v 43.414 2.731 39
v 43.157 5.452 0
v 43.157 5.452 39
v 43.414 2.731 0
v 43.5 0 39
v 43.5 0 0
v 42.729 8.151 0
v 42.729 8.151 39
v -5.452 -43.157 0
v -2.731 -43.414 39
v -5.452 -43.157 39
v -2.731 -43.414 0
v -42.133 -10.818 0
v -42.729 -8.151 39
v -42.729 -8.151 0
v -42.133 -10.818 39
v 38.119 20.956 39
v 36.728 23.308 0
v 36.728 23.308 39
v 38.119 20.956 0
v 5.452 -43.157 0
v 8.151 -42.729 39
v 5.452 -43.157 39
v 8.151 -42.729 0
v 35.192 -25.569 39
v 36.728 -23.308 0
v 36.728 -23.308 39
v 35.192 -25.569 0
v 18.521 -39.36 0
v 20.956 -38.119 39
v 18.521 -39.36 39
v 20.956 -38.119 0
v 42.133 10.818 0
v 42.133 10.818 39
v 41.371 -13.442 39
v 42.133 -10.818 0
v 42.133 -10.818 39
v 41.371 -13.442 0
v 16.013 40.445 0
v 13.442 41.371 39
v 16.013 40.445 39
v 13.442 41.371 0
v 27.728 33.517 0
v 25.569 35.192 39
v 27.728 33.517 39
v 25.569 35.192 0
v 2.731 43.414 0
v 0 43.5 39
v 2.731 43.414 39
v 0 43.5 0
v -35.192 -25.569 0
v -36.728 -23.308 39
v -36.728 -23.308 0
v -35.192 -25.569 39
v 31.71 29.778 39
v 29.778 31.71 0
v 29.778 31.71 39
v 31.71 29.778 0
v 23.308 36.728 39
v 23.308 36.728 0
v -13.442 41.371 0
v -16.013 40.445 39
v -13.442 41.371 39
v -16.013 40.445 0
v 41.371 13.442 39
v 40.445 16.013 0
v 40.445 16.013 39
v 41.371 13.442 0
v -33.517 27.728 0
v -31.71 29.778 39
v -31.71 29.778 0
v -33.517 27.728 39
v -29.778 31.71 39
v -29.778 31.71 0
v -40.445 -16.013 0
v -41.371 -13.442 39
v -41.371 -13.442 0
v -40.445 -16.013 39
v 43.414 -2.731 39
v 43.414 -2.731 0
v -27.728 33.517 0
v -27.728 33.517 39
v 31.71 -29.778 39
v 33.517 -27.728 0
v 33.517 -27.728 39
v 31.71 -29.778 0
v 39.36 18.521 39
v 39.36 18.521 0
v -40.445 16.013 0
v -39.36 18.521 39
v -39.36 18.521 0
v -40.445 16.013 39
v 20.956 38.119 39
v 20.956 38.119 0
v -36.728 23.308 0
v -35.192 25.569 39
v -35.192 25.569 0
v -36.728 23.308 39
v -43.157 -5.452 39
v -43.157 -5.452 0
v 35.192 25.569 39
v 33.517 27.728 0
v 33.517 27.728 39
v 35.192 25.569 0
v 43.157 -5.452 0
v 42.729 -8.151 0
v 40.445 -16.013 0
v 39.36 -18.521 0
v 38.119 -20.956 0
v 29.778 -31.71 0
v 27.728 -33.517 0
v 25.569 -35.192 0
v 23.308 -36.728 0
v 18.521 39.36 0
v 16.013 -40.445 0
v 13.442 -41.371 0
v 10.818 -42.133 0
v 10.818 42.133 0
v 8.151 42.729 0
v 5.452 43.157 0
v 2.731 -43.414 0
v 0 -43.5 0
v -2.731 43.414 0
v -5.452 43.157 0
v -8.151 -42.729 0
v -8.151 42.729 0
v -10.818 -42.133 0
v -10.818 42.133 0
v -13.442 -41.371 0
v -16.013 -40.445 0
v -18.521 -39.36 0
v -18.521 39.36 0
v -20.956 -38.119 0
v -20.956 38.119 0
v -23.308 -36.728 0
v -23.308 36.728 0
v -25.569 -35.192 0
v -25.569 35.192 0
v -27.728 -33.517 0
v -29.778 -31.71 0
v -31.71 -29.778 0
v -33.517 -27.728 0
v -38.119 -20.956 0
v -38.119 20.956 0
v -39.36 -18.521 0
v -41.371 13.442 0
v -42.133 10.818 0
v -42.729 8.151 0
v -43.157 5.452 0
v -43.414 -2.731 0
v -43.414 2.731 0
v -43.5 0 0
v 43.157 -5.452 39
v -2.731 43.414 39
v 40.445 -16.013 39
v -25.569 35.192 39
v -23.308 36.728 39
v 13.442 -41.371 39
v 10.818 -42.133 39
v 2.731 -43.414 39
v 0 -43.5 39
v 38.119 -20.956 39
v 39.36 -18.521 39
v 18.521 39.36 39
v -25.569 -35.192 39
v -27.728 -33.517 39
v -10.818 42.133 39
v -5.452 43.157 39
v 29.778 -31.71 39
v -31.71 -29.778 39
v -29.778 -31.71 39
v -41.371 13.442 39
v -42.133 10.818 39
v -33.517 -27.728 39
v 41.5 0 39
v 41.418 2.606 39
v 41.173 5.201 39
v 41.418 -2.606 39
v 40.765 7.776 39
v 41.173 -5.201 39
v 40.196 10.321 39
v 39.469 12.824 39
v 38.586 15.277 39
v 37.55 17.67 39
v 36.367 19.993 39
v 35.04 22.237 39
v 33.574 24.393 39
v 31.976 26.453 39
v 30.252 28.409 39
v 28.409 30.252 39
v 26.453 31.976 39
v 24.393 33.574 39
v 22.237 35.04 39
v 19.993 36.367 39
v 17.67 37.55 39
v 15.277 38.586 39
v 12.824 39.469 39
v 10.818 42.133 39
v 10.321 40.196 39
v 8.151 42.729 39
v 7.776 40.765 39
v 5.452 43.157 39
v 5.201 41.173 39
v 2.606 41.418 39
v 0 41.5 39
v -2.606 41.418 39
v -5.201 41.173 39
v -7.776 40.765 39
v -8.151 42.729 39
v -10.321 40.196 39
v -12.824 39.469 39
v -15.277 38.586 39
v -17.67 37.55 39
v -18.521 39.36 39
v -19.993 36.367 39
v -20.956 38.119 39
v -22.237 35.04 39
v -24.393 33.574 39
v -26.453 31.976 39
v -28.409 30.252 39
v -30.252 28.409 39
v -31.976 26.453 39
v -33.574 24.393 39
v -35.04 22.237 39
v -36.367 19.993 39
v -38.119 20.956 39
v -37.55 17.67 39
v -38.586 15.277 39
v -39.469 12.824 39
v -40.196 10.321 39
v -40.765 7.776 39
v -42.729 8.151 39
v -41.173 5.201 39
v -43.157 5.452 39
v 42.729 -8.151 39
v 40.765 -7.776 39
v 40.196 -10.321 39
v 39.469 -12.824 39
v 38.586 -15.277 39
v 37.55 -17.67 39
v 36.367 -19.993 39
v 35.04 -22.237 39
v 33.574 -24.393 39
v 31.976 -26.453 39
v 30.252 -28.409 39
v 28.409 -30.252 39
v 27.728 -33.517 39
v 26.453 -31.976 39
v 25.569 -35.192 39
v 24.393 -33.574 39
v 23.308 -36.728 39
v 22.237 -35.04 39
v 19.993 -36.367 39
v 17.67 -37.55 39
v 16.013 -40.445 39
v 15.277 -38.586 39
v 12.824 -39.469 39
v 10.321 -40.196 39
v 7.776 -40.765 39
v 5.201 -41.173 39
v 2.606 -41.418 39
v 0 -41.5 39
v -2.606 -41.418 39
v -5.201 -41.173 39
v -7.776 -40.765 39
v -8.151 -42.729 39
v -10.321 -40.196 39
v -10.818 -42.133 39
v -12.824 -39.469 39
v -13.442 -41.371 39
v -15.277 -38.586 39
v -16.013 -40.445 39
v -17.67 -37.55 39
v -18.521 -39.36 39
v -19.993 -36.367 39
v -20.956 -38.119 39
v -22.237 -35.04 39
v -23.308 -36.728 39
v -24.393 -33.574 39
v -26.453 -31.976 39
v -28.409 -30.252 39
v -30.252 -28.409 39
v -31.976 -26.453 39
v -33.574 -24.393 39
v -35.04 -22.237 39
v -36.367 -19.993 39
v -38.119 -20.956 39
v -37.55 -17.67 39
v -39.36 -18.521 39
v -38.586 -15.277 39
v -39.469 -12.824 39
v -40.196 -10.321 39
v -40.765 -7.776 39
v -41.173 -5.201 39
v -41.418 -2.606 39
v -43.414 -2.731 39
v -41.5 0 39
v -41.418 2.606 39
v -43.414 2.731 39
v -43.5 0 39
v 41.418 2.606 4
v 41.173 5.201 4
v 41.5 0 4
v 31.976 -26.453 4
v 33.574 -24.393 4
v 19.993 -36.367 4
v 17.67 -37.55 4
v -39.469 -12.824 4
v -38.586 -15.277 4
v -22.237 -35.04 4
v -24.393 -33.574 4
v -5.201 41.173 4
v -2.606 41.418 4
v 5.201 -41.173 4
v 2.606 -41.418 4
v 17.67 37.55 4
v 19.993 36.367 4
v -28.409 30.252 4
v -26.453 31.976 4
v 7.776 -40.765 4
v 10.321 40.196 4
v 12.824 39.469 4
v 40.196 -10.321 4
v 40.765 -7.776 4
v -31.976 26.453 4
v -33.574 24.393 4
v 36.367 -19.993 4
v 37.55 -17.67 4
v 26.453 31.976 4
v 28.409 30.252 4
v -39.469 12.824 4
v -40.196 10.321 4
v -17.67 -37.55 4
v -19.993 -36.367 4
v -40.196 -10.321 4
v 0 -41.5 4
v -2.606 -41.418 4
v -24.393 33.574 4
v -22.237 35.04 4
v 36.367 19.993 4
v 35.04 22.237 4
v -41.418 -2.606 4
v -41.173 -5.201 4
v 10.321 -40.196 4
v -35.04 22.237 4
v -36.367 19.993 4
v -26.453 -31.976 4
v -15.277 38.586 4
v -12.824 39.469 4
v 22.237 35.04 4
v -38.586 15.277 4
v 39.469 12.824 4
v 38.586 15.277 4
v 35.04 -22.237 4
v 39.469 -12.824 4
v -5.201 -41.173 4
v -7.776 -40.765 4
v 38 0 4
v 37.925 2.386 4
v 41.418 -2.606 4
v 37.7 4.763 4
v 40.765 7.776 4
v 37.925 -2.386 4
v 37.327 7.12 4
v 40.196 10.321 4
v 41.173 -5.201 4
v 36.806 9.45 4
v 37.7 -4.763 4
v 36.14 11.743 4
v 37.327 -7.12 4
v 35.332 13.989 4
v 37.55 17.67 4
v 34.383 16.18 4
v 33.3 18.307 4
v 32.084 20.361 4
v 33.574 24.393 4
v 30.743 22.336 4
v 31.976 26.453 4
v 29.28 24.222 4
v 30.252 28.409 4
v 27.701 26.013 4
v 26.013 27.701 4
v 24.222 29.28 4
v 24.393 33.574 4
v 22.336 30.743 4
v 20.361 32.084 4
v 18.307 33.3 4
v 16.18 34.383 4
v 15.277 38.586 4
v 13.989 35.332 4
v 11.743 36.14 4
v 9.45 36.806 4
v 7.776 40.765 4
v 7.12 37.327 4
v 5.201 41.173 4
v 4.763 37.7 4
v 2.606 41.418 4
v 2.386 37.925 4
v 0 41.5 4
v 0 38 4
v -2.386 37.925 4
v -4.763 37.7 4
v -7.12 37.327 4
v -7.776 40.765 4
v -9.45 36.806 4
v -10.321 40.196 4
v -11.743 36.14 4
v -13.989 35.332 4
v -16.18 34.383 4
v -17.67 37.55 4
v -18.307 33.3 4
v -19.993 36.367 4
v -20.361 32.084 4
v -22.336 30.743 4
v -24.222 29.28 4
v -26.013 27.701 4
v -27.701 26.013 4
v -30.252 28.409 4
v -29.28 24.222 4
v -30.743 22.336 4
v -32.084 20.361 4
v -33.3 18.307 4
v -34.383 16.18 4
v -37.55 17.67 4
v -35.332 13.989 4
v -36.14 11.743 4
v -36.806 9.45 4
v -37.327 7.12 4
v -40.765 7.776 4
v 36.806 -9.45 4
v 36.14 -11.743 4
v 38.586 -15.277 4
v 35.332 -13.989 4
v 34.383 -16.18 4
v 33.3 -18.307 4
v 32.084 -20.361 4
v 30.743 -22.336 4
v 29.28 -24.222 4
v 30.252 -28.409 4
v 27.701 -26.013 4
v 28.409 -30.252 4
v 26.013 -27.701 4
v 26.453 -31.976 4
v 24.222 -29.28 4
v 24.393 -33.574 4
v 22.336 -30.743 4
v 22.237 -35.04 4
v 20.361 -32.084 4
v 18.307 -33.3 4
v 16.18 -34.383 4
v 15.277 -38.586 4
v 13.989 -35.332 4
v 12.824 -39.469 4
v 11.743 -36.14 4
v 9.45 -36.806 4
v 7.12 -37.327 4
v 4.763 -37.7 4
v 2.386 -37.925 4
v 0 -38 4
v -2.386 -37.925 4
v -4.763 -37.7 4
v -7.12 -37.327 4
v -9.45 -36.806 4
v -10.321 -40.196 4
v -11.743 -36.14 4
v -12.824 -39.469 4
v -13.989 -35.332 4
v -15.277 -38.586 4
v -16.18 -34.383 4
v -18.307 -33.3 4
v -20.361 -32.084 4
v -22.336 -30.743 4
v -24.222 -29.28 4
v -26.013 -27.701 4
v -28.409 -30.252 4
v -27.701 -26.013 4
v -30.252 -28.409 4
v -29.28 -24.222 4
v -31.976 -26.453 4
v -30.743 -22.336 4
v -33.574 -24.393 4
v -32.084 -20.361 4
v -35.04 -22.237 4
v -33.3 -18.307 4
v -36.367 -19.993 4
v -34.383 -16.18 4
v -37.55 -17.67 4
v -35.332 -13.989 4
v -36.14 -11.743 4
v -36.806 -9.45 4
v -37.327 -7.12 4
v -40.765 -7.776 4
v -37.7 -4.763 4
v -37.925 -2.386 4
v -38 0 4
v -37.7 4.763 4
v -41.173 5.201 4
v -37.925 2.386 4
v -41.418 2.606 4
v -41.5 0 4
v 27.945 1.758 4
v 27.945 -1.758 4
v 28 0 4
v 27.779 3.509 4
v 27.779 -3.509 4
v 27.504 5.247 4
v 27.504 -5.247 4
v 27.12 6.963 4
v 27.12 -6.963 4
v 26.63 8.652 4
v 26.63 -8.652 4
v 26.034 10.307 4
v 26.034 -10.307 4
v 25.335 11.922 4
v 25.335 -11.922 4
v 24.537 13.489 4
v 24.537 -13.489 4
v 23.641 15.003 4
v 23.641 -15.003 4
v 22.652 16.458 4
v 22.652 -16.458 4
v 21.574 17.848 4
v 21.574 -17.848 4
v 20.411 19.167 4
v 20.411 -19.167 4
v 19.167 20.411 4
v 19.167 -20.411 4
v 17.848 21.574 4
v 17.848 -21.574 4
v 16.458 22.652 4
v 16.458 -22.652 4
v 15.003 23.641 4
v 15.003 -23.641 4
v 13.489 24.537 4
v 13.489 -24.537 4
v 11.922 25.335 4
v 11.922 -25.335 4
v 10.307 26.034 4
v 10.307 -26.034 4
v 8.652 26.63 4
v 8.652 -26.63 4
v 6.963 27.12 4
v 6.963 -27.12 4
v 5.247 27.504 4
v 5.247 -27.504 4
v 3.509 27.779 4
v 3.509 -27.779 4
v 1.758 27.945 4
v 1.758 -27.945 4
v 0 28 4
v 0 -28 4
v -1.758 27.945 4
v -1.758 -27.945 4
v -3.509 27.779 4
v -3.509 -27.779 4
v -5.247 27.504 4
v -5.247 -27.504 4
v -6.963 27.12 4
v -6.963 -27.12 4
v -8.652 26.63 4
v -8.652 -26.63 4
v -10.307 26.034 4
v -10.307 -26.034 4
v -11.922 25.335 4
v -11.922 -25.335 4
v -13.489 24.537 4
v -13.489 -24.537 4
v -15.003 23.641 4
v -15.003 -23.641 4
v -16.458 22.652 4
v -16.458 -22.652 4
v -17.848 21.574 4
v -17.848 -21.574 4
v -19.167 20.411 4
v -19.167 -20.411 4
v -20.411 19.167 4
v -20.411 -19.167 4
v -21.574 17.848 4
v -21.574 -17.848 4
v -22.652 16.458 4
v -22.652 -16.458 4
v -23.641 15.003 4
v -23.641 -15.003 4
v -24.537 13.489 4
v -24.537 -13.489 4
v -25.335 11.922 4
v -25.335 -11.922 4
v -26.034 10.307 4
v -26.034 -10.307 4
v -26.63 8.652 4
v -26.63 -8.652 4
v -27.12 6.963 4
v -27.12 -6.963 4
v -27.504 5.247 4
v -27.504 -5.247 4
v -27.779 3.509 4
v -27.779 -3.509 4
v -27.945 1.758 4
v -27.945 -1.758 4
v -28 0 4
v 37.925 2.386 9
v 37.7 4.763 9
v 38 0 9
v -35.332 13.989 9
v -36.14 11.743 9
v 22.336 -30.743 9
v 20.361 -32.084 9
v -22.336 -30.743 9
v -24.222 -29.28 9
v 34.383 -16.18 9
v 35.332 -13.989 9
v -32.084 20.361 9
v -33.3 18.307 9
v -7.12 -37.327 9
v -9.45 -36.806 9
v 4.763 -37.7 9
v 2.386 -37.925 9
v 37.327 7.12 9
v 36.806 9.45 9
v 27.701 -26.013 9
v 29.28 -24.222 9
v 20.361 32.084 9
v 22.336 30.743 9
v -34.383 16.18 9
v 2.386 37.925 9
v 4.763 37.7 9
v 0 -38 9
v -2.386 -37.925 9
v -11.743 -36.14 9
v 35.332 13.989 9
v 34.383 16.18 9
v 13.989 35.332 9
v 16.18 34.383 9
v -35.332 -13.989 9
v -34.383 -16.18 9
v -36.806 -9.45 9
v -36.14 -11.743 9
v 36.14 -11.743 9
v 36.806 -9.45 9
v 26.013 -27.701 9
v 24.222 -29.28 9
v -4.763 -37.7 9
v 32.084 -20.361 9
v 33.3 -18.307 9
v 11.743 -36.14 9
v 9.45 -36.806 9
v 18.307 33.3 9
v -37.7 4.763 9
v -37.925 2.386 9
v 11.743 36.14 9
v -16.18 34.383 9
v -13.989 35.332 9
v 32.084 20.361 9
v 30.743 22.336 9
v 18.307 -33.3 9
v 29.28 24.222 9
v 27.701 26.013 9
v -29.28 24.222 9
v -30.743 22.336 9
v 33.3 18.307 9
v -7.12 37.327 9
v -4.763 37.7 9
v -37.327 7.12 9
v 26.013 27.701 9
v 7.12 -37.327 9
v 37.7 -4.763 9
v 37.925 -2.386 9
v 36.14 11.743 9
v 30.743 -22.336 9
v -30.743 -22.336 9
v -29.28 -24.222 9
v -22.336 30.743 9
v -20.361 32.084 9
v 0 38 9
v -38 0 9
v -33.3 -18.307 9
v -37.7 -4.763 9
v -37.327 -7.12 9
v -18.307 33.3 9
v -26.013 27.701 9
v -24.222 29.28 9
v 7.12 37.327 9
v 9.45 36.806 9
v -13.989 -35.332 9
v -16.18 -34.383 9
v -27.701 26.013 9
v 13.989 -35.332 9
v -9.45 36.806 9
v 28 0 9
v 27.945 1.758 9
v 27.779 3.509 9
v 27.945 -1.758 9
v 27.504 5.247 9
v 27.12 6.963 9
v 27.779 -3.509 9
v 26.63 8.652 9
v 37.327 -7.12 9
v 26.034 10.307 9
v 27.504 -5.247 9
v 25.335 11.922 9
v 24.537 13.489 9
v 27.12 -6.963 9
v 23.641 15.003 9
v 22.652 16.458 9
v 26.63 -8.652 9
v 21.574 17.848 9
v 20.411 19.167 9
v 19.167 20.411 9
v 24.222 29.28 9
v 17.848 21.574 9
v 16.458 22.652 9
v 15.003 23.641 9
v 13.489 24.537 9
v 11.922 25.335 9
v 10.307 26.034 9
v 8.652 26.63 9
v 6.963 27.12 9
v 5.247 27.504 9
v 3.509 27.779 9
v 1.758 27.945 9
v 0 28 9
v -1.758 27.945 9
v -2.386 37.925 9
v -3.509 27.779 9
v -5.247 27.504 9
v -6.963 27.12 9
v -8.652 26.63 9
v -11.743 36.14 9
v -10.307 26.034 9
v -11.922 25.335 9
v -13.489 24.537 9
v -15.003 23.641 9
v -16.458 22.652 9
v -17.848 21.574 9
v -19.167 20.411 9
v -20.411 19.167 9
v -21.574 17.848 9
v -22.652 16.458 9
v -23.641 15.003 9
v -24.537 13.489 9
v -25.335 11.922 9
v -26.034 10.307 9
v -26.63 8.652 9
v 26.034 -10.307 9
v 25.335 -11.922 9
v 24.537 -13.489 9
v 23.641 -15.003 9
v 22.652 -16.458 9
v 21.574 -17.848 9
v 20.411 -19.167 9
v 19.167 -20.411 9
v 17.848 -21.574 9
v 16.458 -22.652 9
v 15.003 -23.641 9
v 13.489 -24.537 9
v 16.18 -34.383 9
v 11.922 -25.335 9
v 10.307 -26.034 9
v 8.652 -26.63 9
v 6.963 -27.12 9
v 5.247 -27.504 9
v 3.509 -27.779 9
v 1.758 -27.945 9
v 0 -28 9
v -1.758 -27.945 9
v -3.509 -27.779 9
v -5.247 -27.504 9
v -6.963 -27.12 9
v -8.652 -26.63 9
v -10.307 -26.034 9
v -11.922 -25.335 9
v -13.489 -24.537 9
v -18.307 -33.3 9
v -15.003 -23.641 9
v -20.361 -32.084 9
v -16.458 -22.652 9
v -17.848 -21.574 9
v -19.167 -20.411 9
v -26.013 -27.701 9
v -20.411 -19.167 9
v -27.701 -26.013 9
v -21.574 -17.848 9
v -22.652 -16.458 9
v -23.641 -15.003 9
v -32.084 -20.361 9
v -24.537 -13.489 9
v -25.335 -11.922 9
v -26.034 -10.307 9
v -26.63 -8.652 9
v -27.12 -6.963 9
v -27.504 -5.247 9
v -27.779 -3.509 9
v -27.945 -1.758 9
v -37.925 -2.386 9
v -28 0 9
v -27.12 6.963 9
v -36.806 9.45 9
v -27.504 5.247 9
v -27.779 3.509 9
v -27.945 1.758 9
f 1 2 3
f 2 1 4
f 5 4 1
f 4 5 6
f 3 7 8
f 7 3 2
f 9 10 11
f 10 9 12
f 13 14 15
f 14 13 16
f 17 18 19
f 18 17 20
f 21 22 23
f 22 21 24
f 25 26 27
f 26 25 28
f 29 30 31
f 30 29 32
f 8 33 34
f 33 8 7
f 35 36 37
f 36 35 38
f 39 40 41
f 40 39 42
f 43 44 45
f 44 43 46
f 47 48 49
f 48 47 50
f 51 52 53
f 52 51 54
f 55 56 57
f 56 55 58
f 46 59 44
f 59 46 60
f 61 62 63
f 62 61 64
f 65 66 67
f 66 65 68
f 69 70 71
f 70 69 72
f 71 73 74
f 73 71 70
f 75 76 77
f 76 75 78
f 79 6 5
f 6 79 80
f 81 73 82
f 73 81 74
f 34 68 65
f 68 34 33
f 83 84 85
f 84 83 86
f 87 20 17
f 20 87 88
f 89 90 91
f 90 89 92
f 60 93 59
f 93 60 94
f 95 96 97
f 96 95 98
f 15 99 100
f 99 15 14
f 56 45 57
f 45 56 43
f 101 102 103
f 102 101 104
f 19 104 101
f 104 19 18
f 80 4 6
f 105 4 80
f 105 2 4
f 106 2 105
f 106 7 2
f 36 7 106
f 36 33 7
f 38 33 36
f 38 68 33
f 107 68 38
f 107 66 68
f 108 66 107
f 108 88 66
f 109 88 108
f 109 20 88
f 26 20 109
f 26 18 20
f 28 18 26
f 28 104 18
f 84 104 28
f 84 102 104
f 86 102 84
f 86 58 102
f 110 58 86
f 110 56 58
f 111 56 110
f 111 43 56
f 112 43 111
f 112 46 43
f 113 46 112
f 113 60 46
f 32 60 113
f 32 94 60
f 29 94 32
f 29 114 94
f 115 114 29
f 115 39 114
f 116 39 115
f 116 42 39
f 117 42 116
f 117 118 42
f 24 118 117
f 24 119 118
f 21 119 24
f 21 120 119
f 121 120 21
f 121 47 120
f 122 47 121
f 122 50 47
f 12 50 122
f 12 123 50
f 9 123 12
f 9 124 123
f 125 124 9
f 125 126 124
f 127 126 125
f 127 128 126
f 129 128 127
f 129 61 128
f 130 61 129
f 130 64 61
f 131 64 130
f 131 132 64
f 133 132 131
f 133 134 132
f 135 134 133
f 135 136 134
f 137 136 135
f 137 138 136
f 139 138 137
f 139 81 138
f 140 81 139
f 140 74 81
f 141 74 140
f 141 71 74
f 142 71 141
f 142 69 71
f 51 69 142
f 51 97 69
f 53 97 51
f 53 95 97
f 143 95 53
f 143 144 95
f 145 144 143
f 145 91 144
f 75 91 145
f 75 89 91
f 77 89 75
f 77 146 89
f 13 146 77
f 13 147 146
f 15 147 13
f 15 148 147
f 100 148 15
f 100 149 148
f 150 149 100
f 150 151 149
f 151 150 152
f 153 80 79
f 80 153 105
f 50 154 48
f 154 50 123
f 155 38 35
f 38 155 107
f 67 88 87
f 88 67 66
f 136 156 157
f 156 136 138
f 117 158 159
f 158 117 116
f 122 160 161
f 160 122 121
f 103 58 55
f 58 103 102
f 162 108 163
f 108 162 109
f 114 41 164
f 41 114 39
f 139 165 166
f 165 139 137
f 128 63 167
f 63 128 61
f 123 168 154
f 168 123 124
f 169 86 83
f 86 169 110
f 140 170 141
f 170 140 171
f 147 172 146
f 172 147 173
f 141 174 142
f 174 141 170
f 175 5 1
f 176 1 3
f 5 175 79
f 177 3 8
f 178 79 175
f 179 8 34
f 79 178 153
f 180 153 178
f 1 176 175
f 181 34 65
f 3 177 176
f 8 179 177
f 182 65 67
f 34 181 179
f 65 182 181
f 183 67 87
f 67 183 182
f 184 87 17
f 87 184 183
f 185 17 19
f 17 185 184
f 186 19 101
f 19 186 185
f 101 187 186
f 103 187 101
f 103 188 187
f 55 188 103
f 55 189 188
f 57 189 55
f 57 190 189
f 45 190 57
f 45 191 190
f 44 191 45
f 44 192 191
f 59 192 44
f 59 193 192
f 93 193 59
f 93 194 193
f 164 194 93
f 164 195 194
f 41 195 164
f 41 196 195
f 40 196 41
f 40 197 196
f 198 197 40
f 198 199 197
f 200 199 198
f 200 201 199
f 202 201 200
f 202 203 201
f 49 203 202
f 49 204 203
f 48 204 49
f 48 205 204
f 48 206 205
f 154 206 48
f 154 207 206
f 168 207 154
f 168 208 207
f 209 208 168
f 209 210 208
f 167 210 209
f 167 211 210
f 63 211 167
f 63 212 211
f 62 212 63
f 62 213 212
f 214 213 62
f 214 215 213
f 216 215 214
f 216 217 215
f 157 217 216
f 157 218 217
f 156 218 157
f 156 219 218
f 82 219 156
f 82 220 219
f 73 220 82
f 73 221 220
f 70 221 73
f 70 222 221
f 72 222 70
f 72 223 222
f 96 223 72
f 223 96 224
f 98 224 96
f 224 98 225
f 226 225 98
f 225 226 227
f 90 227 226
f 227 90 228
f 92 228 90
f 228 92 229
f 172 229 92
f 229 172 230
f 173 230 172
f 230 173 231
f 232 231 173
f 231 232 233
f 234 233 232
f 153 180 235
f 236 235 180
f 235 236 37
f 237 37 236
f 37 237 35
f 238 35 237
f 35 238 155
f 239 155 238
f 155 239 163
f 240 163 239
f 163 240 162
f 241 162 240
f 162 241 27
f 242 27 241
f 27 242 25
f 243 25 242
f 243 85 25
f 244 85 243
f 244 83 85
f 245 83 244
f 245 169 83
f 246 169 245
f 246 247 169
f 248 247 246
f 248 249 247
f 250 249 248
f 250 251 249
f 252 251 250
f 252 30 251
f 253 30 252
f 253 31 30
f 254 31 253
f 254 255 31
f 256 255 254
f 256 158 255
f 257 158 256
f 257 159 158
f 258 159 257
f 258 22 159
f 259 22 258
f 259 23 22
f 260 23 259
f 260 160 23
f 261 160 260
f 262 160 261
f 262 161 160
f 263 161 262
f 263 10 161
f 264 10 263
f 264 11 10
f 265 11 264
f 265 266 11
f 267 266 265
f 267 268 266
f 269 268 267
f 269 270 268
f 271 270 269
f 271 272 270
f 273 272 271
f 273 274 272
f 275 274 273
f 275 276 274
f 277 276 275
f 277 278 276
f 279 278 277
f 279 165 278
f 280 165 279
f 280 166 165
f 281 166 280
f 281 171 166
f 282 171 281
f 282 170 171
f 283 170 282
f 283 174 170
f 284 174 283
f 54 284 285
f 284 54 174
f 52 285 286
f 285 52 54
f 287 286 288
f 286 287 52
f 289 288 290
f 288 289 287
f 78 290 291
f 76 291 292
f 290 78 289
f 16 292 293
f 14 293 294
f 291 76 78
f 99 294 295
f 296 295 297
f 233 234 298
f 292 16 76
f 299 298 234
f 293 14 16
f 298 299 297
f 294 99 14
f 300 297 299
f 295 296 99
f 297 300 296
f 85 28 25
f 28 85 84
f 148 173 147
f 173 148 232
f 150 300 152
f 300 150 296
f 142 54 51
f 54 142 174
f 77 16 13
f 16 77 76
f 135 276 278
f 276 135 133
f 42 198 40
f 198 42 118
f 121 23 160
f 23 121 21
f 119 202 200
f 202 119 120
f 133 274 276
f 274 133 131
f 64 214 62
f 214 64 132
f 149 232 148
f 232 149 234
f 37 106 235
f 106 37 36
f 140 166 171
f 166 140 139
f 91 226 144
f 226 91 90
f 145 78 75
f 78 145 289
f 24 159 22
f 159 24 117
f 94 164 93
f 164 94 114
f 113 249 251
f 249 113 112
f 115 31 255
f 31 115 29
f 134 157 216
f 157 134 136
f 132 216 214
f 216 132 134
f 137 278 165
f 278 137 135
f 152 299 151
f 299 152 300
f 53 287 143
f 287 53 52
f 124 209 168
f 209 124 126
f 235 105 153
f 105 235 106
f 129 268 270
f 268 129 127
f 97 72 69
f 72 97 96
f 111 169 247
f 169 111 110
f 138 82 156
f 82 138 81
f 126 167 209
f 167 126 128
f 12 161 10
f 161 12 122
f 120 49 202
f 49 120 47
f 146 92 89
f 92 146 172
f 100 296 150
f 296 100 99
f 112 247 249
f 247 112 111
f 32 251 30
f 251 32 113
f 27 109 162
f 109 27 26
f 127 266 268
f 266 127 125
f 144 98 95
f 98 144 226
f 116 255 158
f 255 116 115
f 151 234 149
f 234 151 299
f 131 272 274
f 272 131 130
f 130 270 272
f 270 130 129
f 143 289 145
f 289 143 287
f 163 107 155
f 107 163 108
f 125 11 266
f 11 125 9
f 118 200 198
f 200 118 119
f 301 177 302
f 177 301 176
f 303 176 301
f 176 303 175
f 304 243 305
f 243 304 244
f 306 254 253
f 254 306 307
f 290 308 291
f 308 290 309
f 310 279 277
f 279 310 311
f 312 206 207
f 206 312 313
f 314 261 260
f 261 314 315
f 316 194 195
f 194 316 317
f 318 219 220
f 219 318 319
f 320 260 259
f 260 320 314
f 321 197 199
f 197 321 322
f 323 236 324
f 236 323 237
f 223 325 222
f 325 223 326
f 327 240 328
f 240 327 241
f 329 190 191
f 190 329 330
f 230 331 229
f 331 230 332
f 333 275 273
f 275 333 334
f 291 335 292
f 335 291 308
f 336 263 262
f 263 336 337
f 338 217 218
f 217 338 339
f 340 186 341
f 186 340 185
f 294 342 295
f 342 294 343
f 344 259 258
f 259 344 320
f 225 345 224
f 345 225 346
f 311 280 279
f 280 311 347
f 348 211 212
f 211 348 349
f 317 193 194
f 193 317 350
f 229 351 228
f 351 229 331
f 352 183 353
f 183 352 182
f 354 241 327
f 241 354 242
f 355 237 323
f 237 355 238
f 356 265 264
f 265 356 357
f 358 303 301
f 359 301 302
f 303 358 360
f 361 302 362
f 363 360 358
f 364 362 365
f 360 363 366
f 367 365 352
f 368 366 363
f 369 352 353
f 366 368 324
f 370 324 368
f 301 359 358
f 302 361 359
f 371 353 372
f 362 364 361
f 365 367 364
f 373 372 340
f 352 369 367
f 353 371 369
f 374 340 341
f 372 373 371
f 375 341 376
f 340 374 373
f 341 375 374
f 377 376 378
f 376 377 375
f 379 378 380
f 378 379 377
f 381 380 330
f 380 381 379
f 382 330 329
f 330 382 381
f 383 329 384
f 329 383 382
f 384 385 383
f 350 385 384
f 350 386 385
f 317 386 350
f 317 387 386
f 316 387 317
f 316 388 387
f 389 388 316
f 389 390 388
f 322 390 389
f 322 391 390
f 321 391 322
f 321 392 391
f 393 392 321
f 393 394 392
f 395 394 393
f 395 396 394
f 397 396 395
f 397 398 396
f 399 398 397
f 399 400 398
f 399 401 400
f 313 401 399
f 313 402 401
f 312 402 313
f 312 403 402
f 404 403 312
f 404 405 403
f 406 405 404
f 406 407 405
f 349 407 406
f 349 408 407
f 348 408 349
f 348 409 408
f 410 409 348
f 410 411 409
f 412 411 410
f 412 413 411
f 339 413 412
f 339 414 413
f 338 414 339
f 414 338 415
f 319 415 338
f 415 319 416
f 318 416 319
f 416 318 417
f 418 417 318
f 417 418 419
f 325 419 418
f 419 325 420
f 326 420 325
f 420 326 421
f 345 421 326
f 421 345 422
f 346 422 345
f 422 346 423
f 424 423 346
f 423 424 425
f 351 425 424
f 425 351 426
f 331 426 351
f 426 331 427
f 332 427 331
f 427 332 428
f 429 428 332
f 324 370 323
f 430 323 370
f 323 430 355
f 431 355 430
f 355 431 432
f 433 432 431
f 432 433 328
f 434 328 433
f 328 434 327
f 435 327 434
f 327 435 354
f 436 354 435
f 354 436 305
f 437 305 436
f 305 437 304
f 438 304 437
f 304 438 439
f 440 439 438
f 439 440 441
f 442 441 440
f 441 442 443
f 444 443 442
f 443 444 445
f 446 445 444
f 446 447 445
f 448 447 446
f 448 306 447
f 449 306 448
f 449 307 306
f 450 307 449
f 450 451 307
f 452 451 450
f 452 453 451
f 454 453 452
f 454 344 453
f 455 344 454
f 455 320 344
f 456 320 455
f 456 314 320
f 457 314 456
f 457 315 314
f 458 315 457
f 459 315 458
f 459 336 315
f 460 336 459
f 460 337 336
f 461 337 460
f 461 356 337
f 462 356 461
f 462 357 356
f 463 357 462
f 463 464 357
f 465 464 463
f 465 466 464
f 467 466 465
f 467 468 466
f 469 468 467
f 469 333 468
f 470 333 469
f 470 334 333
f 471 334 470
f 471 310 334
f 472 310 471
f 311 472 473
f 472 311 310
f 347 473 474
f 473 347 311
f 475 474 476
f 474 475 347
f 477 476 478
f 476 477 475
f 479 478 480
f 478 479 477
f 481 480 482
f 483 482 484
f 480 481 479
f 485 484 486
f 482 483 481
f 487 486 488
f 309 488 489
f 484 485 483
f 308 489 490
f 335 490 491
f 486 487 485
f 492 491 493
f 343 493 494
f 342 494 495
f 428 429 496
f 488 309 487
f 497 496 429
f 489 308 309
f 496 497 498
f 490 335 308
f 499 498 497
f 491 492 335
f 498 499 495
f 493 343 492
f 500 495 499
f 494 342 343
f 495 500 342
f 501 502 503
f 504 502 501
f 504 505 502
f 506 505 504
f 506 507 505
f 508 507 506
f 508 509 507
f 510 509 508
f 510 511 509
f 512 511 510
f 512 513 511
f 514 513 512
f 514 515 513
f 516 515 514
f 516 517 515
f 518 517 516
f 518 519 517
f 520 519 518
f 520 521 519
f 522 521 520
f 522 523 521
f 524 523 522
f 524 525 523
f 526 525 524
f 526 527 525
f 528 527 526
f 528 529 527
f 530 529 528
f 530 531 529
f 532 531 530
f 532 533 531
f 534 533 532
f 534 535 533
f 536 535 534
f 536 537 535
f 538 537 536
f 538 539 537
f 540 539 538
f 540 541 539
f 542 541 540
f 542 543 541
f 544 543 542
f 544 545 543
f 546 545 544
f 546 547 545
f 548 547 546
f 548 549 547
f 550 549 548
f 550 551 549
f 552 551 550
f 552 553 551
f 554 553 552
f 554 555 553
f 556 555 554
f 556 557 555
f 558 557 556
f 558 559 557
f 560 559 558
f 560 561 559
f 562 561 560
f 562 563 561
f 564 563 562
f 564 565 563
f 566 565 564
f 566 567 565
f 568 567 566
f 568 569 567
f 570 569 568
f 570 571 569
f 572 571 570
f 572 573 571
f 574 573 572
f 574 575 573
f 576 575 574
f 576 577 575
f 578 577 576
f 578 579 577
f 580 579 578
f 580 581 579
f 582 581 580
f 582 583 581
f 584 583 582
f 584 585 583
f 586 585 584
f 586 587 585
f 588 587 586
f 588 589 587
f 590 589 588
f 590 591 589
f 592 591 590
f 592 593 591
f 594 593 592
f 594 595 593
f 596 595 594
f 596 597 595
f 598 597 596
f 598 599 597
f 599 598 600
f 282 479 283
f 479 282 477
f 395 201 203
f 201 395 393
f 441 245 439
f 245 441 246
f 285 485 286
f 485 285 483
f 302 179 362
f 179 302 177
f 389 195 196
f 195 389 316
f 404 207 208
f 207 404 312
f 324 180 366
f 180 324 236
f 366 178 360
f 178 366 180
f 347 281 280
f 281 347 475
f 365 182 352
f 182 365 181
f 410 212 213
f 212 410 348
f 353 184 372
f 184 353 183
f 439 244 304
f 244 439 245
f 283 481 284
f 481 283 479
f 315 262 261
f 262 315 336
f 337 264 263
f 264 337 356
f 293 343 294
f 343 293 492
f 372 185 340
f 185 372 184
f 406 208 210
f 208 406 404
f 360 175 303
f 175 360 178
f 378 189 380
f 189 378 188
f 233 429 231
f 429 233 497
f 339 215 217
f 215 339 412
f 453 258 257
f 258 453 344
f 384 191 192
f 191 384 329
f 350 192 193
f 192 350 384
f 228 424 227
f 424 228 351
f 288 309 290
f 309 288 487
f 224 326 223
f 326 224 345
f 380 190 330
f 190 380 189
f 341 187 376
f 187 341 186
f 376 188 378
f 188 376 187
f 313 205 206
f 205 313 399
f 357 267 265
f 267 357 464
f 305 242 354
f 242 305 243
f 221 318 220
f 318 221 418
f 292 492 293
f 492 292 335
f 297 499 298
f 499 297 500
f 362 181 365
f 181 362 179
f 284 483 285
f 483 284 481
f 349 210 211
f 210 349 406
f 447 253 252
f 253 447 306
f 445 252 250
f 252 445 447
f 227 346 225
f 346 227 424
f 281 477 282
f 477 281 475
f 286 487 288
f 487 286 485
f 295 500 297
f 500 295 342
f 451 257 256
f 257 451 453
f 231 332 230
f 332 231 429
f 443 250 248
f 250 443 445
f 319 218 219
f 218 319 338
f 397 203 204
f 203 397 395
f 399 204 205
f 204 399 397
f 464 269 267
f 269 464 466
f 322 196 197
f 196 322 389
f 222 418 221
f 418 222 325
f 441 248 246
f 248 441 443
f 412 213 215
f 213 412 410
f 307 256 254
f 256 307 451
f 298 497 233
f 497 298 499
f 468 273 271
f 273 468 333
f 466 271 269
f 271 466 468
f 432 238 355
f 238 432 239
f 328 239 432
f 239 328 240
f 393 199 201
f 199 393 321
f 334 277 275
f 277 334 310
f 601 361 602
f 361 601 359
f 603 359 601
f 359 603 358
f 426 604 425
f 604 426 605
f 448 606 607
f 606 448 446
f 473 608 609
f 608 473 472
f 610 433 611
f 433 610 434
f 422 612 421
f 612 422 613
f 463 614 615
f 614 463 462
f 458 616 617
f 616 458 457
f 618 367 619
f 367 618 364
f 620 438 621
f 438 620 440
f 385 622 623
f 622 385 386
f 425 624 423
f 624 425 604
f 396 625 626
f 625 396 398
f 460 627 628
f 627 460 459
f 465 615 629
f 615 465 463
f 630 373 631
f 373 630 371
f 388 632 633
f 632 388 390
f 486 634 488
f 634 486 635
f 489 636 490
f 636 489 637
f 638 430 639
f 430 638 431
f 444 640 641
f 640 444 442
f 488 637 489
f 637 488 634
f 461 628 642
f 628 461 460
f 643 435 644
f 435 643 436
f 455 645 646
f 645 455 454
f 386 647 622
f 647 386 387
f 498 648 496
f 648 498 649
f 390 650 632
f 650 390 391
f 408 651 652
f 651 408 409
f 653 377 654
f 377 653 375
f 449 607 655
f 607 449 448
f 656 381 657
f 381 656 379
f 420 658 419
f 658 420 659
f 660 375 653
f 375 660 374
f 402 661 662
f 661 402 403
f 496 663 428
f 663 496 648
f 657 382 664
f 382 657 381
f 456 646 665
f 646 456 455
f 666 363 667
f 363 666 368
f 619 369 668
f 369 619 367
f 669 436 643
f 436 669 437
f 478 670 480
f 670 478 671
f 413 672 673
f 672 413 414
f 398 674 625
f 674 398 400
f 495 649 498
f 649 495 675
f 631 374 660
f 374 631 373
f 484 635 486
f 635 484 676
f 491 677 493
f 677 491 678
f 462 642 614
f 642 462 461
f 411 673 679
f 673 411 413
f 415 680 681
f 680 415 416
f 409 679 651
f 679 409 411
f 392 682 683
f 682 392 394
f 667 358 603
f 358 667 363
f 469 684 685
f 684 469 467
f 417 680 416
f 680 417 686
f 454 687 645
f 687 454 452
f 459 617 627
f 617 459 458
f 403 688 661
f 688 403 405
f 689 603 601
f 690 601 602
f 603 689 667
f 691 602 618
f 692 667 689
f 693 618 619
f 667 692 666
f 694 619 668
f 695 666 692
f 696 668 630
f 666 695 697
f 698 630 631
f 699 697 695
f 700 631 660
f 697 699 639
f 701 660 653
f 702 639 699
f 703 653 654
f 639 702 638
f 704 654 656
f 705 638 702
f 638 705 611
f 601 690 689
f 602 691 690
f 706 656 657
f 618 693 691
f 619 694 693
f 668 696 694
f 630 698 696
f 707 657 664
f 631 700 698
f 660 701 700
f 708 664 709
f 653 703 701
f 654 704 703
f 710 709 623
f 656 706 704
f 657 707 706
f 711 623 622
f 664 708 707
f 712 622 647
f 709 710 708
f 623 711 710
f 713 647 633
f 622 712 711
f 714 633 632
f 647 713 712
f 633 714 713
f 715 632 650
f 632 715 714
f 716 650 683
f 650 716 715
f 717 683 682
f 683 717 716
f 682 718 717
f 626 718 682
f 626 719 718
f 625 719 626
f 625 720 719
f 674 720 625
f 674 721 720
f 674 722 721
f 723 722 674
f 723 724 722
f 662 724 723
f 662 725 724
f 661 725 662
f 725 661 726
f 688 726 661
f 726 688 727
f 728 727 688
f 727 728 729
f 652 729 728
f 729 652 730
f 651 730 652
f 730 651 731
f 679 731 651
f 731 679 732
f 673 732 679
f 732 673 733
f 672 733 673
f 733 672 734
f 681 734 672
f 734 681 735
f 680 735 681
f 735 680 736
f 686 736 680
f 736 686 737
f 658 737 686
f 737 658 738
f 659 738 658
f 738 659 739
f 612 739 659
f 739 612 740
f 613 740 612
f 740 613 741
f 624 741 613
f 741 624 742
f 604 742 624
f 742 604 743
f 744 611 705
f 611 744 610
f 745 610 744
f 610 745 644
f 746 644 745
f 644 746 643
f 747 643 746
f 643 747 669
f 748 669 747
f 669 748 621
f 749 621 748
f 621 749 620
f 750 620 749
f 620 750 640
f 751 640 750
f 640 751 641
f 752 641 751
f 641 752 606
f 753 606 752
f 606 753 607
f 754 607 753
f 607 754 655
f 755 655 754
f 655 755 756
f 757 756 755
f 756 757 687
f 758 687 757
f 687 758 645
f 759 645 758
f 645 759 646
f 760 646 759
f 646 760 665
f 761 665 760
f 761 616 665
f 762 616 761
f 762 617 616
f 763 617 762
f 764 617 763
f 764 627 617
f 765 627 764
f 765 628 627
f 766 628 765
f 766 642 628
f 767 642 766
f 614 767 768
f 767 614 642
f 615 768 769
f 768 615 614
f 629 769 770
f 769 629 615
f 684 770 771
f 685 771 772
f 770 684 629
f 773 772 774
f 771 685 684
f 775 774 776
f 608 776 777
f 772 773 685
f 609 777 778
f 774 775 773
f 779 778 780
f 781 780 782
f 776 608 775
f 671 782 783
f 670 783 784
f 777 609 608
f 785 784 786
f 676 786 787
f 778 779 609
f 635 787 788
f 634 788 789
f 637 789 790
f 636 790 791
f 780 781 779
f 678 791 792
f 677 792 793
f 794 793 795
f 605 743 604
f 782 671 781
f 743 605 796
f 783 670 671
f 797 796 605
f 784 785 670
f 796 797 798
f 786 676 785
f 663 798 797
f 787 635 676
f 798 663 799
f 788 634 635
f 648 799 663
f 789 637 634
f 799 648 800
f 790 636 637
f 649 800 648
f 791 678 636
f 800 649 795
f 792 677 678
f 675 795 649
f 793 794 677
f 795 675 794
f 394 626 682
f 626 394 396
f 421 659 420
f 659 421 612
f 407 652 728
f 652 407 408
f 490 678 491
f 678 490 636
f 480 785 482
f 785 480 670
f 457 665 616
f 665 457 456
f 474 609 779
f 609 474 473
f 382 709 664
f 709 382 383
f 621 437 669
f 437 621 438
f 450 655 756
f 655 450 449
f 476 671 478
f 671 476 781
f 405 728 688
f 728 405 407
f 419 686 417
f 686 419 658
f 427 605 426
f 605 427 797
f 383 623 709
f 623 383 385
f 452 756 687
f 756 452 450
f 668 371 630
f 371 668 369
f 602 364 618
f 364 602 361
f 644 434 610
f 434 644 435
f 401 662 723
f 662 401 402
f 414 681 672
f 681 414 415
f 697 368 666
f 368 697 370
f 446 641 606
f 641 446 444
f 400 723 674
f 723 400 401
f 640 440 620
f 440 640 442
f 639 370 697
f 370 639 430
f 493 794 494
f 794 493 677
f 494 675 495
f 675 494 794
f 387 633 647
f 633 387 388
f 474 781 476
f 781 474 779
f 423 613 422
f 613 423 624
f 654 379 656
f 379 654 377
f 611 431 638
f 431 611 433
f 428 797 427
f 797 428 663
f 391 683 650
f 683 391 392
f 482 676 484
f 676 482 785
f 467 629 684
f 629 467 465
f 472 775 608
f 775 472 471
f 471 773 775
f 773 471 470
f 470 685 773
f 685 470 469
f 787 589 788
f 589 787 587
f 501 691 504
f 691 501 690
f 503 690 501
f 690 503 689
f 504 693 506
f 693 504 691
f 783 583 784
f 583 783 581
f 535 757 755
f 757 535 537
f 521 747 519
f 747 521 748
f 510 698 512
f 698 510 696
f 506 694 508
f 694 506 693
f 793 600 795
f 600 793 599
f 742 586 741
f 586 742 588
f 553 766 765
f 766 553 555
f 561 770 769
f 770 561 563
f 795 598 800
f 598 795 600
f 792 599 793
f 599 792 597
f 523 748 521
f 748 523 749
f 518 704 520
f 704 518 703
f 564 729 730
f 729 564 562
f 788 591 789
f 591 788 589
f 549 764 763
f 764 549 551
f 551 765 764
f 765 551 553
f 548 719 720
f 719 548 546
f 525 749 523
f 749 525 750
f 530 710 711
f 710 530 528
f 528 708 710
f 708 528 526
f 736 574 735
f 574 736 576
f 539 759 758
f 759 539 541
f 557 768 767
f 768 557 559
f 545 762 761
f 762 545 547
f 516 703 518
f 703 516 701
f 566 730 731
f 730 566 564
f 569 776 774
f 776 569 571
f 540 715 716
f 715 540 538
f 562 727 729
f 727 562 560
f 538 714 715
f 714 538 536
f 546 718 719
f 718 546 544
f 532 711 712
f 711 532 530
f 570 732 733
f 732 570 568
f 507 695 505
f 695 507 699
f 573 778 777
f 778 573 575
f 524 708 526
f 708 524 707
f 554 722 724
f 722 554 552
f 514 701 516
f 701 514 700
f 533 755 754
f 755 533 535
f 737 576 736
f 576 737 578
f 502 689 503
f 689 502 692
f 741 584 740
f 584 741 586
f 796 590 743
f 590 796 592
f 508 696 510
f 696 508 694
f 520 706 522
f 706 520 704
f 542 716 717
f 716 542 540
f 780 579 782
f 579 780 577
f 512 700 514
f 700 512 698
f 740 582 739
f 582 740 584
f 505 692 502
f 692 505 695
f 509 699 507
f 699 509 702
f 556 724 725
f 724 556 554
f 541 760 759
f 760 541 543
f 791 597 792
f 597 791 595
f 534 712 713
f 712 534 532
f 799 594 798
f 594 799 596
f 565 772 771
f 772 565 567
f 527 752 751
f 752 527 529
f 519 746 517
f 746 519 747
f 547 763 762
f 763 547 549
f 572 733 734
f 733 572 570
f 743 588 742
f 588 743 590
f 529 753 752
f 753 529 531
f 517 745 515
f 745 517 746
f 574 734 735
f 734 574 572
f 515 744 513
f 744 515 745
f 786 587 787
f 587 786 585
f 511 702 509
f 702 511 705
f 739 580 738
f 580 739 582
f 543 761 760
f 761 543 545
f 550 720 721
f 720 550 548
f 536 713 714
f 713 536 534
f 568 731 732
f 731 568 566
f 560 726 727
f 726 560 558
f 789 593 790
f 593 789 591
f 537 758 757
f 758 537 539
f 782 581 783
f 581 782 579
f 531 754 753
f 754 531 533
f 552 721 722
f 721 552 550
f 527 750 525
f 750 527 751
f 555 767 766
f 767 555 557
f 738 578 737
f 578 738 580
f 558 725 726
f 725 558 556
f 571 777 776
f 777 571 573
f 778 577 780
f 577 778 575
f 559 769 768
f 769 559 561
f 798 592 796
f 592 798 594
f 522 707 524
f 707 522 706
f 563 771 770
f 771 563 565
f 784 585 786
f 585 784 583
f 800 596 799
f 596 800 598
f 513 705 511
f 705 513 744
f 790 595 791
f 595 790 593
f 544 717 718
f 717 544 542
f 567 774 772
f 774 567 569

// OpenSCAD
$fn = 100;

DIA_EXT = 75.5; // External diameter of the lens
DIA_INT = 72; // Internal diameter of the lens
WALL_THICKNESS = 2;
CAP_HEIGHT = 20;

module lens_cover(r, ri, h, t){
    difference(){
        cylinder(r=r+t, h=h);
        translate([0, 0, 4]) cylinder(r=r, h=h);
    }

    difference(){
        cylinder(r=ri, h=9);
        translate([0, 0, 4]) cylinder(r=ri-10, h=h);
    }
}

lens_cover(
     r=41.5,
     ri=38,
     h=39,
     t=2);
